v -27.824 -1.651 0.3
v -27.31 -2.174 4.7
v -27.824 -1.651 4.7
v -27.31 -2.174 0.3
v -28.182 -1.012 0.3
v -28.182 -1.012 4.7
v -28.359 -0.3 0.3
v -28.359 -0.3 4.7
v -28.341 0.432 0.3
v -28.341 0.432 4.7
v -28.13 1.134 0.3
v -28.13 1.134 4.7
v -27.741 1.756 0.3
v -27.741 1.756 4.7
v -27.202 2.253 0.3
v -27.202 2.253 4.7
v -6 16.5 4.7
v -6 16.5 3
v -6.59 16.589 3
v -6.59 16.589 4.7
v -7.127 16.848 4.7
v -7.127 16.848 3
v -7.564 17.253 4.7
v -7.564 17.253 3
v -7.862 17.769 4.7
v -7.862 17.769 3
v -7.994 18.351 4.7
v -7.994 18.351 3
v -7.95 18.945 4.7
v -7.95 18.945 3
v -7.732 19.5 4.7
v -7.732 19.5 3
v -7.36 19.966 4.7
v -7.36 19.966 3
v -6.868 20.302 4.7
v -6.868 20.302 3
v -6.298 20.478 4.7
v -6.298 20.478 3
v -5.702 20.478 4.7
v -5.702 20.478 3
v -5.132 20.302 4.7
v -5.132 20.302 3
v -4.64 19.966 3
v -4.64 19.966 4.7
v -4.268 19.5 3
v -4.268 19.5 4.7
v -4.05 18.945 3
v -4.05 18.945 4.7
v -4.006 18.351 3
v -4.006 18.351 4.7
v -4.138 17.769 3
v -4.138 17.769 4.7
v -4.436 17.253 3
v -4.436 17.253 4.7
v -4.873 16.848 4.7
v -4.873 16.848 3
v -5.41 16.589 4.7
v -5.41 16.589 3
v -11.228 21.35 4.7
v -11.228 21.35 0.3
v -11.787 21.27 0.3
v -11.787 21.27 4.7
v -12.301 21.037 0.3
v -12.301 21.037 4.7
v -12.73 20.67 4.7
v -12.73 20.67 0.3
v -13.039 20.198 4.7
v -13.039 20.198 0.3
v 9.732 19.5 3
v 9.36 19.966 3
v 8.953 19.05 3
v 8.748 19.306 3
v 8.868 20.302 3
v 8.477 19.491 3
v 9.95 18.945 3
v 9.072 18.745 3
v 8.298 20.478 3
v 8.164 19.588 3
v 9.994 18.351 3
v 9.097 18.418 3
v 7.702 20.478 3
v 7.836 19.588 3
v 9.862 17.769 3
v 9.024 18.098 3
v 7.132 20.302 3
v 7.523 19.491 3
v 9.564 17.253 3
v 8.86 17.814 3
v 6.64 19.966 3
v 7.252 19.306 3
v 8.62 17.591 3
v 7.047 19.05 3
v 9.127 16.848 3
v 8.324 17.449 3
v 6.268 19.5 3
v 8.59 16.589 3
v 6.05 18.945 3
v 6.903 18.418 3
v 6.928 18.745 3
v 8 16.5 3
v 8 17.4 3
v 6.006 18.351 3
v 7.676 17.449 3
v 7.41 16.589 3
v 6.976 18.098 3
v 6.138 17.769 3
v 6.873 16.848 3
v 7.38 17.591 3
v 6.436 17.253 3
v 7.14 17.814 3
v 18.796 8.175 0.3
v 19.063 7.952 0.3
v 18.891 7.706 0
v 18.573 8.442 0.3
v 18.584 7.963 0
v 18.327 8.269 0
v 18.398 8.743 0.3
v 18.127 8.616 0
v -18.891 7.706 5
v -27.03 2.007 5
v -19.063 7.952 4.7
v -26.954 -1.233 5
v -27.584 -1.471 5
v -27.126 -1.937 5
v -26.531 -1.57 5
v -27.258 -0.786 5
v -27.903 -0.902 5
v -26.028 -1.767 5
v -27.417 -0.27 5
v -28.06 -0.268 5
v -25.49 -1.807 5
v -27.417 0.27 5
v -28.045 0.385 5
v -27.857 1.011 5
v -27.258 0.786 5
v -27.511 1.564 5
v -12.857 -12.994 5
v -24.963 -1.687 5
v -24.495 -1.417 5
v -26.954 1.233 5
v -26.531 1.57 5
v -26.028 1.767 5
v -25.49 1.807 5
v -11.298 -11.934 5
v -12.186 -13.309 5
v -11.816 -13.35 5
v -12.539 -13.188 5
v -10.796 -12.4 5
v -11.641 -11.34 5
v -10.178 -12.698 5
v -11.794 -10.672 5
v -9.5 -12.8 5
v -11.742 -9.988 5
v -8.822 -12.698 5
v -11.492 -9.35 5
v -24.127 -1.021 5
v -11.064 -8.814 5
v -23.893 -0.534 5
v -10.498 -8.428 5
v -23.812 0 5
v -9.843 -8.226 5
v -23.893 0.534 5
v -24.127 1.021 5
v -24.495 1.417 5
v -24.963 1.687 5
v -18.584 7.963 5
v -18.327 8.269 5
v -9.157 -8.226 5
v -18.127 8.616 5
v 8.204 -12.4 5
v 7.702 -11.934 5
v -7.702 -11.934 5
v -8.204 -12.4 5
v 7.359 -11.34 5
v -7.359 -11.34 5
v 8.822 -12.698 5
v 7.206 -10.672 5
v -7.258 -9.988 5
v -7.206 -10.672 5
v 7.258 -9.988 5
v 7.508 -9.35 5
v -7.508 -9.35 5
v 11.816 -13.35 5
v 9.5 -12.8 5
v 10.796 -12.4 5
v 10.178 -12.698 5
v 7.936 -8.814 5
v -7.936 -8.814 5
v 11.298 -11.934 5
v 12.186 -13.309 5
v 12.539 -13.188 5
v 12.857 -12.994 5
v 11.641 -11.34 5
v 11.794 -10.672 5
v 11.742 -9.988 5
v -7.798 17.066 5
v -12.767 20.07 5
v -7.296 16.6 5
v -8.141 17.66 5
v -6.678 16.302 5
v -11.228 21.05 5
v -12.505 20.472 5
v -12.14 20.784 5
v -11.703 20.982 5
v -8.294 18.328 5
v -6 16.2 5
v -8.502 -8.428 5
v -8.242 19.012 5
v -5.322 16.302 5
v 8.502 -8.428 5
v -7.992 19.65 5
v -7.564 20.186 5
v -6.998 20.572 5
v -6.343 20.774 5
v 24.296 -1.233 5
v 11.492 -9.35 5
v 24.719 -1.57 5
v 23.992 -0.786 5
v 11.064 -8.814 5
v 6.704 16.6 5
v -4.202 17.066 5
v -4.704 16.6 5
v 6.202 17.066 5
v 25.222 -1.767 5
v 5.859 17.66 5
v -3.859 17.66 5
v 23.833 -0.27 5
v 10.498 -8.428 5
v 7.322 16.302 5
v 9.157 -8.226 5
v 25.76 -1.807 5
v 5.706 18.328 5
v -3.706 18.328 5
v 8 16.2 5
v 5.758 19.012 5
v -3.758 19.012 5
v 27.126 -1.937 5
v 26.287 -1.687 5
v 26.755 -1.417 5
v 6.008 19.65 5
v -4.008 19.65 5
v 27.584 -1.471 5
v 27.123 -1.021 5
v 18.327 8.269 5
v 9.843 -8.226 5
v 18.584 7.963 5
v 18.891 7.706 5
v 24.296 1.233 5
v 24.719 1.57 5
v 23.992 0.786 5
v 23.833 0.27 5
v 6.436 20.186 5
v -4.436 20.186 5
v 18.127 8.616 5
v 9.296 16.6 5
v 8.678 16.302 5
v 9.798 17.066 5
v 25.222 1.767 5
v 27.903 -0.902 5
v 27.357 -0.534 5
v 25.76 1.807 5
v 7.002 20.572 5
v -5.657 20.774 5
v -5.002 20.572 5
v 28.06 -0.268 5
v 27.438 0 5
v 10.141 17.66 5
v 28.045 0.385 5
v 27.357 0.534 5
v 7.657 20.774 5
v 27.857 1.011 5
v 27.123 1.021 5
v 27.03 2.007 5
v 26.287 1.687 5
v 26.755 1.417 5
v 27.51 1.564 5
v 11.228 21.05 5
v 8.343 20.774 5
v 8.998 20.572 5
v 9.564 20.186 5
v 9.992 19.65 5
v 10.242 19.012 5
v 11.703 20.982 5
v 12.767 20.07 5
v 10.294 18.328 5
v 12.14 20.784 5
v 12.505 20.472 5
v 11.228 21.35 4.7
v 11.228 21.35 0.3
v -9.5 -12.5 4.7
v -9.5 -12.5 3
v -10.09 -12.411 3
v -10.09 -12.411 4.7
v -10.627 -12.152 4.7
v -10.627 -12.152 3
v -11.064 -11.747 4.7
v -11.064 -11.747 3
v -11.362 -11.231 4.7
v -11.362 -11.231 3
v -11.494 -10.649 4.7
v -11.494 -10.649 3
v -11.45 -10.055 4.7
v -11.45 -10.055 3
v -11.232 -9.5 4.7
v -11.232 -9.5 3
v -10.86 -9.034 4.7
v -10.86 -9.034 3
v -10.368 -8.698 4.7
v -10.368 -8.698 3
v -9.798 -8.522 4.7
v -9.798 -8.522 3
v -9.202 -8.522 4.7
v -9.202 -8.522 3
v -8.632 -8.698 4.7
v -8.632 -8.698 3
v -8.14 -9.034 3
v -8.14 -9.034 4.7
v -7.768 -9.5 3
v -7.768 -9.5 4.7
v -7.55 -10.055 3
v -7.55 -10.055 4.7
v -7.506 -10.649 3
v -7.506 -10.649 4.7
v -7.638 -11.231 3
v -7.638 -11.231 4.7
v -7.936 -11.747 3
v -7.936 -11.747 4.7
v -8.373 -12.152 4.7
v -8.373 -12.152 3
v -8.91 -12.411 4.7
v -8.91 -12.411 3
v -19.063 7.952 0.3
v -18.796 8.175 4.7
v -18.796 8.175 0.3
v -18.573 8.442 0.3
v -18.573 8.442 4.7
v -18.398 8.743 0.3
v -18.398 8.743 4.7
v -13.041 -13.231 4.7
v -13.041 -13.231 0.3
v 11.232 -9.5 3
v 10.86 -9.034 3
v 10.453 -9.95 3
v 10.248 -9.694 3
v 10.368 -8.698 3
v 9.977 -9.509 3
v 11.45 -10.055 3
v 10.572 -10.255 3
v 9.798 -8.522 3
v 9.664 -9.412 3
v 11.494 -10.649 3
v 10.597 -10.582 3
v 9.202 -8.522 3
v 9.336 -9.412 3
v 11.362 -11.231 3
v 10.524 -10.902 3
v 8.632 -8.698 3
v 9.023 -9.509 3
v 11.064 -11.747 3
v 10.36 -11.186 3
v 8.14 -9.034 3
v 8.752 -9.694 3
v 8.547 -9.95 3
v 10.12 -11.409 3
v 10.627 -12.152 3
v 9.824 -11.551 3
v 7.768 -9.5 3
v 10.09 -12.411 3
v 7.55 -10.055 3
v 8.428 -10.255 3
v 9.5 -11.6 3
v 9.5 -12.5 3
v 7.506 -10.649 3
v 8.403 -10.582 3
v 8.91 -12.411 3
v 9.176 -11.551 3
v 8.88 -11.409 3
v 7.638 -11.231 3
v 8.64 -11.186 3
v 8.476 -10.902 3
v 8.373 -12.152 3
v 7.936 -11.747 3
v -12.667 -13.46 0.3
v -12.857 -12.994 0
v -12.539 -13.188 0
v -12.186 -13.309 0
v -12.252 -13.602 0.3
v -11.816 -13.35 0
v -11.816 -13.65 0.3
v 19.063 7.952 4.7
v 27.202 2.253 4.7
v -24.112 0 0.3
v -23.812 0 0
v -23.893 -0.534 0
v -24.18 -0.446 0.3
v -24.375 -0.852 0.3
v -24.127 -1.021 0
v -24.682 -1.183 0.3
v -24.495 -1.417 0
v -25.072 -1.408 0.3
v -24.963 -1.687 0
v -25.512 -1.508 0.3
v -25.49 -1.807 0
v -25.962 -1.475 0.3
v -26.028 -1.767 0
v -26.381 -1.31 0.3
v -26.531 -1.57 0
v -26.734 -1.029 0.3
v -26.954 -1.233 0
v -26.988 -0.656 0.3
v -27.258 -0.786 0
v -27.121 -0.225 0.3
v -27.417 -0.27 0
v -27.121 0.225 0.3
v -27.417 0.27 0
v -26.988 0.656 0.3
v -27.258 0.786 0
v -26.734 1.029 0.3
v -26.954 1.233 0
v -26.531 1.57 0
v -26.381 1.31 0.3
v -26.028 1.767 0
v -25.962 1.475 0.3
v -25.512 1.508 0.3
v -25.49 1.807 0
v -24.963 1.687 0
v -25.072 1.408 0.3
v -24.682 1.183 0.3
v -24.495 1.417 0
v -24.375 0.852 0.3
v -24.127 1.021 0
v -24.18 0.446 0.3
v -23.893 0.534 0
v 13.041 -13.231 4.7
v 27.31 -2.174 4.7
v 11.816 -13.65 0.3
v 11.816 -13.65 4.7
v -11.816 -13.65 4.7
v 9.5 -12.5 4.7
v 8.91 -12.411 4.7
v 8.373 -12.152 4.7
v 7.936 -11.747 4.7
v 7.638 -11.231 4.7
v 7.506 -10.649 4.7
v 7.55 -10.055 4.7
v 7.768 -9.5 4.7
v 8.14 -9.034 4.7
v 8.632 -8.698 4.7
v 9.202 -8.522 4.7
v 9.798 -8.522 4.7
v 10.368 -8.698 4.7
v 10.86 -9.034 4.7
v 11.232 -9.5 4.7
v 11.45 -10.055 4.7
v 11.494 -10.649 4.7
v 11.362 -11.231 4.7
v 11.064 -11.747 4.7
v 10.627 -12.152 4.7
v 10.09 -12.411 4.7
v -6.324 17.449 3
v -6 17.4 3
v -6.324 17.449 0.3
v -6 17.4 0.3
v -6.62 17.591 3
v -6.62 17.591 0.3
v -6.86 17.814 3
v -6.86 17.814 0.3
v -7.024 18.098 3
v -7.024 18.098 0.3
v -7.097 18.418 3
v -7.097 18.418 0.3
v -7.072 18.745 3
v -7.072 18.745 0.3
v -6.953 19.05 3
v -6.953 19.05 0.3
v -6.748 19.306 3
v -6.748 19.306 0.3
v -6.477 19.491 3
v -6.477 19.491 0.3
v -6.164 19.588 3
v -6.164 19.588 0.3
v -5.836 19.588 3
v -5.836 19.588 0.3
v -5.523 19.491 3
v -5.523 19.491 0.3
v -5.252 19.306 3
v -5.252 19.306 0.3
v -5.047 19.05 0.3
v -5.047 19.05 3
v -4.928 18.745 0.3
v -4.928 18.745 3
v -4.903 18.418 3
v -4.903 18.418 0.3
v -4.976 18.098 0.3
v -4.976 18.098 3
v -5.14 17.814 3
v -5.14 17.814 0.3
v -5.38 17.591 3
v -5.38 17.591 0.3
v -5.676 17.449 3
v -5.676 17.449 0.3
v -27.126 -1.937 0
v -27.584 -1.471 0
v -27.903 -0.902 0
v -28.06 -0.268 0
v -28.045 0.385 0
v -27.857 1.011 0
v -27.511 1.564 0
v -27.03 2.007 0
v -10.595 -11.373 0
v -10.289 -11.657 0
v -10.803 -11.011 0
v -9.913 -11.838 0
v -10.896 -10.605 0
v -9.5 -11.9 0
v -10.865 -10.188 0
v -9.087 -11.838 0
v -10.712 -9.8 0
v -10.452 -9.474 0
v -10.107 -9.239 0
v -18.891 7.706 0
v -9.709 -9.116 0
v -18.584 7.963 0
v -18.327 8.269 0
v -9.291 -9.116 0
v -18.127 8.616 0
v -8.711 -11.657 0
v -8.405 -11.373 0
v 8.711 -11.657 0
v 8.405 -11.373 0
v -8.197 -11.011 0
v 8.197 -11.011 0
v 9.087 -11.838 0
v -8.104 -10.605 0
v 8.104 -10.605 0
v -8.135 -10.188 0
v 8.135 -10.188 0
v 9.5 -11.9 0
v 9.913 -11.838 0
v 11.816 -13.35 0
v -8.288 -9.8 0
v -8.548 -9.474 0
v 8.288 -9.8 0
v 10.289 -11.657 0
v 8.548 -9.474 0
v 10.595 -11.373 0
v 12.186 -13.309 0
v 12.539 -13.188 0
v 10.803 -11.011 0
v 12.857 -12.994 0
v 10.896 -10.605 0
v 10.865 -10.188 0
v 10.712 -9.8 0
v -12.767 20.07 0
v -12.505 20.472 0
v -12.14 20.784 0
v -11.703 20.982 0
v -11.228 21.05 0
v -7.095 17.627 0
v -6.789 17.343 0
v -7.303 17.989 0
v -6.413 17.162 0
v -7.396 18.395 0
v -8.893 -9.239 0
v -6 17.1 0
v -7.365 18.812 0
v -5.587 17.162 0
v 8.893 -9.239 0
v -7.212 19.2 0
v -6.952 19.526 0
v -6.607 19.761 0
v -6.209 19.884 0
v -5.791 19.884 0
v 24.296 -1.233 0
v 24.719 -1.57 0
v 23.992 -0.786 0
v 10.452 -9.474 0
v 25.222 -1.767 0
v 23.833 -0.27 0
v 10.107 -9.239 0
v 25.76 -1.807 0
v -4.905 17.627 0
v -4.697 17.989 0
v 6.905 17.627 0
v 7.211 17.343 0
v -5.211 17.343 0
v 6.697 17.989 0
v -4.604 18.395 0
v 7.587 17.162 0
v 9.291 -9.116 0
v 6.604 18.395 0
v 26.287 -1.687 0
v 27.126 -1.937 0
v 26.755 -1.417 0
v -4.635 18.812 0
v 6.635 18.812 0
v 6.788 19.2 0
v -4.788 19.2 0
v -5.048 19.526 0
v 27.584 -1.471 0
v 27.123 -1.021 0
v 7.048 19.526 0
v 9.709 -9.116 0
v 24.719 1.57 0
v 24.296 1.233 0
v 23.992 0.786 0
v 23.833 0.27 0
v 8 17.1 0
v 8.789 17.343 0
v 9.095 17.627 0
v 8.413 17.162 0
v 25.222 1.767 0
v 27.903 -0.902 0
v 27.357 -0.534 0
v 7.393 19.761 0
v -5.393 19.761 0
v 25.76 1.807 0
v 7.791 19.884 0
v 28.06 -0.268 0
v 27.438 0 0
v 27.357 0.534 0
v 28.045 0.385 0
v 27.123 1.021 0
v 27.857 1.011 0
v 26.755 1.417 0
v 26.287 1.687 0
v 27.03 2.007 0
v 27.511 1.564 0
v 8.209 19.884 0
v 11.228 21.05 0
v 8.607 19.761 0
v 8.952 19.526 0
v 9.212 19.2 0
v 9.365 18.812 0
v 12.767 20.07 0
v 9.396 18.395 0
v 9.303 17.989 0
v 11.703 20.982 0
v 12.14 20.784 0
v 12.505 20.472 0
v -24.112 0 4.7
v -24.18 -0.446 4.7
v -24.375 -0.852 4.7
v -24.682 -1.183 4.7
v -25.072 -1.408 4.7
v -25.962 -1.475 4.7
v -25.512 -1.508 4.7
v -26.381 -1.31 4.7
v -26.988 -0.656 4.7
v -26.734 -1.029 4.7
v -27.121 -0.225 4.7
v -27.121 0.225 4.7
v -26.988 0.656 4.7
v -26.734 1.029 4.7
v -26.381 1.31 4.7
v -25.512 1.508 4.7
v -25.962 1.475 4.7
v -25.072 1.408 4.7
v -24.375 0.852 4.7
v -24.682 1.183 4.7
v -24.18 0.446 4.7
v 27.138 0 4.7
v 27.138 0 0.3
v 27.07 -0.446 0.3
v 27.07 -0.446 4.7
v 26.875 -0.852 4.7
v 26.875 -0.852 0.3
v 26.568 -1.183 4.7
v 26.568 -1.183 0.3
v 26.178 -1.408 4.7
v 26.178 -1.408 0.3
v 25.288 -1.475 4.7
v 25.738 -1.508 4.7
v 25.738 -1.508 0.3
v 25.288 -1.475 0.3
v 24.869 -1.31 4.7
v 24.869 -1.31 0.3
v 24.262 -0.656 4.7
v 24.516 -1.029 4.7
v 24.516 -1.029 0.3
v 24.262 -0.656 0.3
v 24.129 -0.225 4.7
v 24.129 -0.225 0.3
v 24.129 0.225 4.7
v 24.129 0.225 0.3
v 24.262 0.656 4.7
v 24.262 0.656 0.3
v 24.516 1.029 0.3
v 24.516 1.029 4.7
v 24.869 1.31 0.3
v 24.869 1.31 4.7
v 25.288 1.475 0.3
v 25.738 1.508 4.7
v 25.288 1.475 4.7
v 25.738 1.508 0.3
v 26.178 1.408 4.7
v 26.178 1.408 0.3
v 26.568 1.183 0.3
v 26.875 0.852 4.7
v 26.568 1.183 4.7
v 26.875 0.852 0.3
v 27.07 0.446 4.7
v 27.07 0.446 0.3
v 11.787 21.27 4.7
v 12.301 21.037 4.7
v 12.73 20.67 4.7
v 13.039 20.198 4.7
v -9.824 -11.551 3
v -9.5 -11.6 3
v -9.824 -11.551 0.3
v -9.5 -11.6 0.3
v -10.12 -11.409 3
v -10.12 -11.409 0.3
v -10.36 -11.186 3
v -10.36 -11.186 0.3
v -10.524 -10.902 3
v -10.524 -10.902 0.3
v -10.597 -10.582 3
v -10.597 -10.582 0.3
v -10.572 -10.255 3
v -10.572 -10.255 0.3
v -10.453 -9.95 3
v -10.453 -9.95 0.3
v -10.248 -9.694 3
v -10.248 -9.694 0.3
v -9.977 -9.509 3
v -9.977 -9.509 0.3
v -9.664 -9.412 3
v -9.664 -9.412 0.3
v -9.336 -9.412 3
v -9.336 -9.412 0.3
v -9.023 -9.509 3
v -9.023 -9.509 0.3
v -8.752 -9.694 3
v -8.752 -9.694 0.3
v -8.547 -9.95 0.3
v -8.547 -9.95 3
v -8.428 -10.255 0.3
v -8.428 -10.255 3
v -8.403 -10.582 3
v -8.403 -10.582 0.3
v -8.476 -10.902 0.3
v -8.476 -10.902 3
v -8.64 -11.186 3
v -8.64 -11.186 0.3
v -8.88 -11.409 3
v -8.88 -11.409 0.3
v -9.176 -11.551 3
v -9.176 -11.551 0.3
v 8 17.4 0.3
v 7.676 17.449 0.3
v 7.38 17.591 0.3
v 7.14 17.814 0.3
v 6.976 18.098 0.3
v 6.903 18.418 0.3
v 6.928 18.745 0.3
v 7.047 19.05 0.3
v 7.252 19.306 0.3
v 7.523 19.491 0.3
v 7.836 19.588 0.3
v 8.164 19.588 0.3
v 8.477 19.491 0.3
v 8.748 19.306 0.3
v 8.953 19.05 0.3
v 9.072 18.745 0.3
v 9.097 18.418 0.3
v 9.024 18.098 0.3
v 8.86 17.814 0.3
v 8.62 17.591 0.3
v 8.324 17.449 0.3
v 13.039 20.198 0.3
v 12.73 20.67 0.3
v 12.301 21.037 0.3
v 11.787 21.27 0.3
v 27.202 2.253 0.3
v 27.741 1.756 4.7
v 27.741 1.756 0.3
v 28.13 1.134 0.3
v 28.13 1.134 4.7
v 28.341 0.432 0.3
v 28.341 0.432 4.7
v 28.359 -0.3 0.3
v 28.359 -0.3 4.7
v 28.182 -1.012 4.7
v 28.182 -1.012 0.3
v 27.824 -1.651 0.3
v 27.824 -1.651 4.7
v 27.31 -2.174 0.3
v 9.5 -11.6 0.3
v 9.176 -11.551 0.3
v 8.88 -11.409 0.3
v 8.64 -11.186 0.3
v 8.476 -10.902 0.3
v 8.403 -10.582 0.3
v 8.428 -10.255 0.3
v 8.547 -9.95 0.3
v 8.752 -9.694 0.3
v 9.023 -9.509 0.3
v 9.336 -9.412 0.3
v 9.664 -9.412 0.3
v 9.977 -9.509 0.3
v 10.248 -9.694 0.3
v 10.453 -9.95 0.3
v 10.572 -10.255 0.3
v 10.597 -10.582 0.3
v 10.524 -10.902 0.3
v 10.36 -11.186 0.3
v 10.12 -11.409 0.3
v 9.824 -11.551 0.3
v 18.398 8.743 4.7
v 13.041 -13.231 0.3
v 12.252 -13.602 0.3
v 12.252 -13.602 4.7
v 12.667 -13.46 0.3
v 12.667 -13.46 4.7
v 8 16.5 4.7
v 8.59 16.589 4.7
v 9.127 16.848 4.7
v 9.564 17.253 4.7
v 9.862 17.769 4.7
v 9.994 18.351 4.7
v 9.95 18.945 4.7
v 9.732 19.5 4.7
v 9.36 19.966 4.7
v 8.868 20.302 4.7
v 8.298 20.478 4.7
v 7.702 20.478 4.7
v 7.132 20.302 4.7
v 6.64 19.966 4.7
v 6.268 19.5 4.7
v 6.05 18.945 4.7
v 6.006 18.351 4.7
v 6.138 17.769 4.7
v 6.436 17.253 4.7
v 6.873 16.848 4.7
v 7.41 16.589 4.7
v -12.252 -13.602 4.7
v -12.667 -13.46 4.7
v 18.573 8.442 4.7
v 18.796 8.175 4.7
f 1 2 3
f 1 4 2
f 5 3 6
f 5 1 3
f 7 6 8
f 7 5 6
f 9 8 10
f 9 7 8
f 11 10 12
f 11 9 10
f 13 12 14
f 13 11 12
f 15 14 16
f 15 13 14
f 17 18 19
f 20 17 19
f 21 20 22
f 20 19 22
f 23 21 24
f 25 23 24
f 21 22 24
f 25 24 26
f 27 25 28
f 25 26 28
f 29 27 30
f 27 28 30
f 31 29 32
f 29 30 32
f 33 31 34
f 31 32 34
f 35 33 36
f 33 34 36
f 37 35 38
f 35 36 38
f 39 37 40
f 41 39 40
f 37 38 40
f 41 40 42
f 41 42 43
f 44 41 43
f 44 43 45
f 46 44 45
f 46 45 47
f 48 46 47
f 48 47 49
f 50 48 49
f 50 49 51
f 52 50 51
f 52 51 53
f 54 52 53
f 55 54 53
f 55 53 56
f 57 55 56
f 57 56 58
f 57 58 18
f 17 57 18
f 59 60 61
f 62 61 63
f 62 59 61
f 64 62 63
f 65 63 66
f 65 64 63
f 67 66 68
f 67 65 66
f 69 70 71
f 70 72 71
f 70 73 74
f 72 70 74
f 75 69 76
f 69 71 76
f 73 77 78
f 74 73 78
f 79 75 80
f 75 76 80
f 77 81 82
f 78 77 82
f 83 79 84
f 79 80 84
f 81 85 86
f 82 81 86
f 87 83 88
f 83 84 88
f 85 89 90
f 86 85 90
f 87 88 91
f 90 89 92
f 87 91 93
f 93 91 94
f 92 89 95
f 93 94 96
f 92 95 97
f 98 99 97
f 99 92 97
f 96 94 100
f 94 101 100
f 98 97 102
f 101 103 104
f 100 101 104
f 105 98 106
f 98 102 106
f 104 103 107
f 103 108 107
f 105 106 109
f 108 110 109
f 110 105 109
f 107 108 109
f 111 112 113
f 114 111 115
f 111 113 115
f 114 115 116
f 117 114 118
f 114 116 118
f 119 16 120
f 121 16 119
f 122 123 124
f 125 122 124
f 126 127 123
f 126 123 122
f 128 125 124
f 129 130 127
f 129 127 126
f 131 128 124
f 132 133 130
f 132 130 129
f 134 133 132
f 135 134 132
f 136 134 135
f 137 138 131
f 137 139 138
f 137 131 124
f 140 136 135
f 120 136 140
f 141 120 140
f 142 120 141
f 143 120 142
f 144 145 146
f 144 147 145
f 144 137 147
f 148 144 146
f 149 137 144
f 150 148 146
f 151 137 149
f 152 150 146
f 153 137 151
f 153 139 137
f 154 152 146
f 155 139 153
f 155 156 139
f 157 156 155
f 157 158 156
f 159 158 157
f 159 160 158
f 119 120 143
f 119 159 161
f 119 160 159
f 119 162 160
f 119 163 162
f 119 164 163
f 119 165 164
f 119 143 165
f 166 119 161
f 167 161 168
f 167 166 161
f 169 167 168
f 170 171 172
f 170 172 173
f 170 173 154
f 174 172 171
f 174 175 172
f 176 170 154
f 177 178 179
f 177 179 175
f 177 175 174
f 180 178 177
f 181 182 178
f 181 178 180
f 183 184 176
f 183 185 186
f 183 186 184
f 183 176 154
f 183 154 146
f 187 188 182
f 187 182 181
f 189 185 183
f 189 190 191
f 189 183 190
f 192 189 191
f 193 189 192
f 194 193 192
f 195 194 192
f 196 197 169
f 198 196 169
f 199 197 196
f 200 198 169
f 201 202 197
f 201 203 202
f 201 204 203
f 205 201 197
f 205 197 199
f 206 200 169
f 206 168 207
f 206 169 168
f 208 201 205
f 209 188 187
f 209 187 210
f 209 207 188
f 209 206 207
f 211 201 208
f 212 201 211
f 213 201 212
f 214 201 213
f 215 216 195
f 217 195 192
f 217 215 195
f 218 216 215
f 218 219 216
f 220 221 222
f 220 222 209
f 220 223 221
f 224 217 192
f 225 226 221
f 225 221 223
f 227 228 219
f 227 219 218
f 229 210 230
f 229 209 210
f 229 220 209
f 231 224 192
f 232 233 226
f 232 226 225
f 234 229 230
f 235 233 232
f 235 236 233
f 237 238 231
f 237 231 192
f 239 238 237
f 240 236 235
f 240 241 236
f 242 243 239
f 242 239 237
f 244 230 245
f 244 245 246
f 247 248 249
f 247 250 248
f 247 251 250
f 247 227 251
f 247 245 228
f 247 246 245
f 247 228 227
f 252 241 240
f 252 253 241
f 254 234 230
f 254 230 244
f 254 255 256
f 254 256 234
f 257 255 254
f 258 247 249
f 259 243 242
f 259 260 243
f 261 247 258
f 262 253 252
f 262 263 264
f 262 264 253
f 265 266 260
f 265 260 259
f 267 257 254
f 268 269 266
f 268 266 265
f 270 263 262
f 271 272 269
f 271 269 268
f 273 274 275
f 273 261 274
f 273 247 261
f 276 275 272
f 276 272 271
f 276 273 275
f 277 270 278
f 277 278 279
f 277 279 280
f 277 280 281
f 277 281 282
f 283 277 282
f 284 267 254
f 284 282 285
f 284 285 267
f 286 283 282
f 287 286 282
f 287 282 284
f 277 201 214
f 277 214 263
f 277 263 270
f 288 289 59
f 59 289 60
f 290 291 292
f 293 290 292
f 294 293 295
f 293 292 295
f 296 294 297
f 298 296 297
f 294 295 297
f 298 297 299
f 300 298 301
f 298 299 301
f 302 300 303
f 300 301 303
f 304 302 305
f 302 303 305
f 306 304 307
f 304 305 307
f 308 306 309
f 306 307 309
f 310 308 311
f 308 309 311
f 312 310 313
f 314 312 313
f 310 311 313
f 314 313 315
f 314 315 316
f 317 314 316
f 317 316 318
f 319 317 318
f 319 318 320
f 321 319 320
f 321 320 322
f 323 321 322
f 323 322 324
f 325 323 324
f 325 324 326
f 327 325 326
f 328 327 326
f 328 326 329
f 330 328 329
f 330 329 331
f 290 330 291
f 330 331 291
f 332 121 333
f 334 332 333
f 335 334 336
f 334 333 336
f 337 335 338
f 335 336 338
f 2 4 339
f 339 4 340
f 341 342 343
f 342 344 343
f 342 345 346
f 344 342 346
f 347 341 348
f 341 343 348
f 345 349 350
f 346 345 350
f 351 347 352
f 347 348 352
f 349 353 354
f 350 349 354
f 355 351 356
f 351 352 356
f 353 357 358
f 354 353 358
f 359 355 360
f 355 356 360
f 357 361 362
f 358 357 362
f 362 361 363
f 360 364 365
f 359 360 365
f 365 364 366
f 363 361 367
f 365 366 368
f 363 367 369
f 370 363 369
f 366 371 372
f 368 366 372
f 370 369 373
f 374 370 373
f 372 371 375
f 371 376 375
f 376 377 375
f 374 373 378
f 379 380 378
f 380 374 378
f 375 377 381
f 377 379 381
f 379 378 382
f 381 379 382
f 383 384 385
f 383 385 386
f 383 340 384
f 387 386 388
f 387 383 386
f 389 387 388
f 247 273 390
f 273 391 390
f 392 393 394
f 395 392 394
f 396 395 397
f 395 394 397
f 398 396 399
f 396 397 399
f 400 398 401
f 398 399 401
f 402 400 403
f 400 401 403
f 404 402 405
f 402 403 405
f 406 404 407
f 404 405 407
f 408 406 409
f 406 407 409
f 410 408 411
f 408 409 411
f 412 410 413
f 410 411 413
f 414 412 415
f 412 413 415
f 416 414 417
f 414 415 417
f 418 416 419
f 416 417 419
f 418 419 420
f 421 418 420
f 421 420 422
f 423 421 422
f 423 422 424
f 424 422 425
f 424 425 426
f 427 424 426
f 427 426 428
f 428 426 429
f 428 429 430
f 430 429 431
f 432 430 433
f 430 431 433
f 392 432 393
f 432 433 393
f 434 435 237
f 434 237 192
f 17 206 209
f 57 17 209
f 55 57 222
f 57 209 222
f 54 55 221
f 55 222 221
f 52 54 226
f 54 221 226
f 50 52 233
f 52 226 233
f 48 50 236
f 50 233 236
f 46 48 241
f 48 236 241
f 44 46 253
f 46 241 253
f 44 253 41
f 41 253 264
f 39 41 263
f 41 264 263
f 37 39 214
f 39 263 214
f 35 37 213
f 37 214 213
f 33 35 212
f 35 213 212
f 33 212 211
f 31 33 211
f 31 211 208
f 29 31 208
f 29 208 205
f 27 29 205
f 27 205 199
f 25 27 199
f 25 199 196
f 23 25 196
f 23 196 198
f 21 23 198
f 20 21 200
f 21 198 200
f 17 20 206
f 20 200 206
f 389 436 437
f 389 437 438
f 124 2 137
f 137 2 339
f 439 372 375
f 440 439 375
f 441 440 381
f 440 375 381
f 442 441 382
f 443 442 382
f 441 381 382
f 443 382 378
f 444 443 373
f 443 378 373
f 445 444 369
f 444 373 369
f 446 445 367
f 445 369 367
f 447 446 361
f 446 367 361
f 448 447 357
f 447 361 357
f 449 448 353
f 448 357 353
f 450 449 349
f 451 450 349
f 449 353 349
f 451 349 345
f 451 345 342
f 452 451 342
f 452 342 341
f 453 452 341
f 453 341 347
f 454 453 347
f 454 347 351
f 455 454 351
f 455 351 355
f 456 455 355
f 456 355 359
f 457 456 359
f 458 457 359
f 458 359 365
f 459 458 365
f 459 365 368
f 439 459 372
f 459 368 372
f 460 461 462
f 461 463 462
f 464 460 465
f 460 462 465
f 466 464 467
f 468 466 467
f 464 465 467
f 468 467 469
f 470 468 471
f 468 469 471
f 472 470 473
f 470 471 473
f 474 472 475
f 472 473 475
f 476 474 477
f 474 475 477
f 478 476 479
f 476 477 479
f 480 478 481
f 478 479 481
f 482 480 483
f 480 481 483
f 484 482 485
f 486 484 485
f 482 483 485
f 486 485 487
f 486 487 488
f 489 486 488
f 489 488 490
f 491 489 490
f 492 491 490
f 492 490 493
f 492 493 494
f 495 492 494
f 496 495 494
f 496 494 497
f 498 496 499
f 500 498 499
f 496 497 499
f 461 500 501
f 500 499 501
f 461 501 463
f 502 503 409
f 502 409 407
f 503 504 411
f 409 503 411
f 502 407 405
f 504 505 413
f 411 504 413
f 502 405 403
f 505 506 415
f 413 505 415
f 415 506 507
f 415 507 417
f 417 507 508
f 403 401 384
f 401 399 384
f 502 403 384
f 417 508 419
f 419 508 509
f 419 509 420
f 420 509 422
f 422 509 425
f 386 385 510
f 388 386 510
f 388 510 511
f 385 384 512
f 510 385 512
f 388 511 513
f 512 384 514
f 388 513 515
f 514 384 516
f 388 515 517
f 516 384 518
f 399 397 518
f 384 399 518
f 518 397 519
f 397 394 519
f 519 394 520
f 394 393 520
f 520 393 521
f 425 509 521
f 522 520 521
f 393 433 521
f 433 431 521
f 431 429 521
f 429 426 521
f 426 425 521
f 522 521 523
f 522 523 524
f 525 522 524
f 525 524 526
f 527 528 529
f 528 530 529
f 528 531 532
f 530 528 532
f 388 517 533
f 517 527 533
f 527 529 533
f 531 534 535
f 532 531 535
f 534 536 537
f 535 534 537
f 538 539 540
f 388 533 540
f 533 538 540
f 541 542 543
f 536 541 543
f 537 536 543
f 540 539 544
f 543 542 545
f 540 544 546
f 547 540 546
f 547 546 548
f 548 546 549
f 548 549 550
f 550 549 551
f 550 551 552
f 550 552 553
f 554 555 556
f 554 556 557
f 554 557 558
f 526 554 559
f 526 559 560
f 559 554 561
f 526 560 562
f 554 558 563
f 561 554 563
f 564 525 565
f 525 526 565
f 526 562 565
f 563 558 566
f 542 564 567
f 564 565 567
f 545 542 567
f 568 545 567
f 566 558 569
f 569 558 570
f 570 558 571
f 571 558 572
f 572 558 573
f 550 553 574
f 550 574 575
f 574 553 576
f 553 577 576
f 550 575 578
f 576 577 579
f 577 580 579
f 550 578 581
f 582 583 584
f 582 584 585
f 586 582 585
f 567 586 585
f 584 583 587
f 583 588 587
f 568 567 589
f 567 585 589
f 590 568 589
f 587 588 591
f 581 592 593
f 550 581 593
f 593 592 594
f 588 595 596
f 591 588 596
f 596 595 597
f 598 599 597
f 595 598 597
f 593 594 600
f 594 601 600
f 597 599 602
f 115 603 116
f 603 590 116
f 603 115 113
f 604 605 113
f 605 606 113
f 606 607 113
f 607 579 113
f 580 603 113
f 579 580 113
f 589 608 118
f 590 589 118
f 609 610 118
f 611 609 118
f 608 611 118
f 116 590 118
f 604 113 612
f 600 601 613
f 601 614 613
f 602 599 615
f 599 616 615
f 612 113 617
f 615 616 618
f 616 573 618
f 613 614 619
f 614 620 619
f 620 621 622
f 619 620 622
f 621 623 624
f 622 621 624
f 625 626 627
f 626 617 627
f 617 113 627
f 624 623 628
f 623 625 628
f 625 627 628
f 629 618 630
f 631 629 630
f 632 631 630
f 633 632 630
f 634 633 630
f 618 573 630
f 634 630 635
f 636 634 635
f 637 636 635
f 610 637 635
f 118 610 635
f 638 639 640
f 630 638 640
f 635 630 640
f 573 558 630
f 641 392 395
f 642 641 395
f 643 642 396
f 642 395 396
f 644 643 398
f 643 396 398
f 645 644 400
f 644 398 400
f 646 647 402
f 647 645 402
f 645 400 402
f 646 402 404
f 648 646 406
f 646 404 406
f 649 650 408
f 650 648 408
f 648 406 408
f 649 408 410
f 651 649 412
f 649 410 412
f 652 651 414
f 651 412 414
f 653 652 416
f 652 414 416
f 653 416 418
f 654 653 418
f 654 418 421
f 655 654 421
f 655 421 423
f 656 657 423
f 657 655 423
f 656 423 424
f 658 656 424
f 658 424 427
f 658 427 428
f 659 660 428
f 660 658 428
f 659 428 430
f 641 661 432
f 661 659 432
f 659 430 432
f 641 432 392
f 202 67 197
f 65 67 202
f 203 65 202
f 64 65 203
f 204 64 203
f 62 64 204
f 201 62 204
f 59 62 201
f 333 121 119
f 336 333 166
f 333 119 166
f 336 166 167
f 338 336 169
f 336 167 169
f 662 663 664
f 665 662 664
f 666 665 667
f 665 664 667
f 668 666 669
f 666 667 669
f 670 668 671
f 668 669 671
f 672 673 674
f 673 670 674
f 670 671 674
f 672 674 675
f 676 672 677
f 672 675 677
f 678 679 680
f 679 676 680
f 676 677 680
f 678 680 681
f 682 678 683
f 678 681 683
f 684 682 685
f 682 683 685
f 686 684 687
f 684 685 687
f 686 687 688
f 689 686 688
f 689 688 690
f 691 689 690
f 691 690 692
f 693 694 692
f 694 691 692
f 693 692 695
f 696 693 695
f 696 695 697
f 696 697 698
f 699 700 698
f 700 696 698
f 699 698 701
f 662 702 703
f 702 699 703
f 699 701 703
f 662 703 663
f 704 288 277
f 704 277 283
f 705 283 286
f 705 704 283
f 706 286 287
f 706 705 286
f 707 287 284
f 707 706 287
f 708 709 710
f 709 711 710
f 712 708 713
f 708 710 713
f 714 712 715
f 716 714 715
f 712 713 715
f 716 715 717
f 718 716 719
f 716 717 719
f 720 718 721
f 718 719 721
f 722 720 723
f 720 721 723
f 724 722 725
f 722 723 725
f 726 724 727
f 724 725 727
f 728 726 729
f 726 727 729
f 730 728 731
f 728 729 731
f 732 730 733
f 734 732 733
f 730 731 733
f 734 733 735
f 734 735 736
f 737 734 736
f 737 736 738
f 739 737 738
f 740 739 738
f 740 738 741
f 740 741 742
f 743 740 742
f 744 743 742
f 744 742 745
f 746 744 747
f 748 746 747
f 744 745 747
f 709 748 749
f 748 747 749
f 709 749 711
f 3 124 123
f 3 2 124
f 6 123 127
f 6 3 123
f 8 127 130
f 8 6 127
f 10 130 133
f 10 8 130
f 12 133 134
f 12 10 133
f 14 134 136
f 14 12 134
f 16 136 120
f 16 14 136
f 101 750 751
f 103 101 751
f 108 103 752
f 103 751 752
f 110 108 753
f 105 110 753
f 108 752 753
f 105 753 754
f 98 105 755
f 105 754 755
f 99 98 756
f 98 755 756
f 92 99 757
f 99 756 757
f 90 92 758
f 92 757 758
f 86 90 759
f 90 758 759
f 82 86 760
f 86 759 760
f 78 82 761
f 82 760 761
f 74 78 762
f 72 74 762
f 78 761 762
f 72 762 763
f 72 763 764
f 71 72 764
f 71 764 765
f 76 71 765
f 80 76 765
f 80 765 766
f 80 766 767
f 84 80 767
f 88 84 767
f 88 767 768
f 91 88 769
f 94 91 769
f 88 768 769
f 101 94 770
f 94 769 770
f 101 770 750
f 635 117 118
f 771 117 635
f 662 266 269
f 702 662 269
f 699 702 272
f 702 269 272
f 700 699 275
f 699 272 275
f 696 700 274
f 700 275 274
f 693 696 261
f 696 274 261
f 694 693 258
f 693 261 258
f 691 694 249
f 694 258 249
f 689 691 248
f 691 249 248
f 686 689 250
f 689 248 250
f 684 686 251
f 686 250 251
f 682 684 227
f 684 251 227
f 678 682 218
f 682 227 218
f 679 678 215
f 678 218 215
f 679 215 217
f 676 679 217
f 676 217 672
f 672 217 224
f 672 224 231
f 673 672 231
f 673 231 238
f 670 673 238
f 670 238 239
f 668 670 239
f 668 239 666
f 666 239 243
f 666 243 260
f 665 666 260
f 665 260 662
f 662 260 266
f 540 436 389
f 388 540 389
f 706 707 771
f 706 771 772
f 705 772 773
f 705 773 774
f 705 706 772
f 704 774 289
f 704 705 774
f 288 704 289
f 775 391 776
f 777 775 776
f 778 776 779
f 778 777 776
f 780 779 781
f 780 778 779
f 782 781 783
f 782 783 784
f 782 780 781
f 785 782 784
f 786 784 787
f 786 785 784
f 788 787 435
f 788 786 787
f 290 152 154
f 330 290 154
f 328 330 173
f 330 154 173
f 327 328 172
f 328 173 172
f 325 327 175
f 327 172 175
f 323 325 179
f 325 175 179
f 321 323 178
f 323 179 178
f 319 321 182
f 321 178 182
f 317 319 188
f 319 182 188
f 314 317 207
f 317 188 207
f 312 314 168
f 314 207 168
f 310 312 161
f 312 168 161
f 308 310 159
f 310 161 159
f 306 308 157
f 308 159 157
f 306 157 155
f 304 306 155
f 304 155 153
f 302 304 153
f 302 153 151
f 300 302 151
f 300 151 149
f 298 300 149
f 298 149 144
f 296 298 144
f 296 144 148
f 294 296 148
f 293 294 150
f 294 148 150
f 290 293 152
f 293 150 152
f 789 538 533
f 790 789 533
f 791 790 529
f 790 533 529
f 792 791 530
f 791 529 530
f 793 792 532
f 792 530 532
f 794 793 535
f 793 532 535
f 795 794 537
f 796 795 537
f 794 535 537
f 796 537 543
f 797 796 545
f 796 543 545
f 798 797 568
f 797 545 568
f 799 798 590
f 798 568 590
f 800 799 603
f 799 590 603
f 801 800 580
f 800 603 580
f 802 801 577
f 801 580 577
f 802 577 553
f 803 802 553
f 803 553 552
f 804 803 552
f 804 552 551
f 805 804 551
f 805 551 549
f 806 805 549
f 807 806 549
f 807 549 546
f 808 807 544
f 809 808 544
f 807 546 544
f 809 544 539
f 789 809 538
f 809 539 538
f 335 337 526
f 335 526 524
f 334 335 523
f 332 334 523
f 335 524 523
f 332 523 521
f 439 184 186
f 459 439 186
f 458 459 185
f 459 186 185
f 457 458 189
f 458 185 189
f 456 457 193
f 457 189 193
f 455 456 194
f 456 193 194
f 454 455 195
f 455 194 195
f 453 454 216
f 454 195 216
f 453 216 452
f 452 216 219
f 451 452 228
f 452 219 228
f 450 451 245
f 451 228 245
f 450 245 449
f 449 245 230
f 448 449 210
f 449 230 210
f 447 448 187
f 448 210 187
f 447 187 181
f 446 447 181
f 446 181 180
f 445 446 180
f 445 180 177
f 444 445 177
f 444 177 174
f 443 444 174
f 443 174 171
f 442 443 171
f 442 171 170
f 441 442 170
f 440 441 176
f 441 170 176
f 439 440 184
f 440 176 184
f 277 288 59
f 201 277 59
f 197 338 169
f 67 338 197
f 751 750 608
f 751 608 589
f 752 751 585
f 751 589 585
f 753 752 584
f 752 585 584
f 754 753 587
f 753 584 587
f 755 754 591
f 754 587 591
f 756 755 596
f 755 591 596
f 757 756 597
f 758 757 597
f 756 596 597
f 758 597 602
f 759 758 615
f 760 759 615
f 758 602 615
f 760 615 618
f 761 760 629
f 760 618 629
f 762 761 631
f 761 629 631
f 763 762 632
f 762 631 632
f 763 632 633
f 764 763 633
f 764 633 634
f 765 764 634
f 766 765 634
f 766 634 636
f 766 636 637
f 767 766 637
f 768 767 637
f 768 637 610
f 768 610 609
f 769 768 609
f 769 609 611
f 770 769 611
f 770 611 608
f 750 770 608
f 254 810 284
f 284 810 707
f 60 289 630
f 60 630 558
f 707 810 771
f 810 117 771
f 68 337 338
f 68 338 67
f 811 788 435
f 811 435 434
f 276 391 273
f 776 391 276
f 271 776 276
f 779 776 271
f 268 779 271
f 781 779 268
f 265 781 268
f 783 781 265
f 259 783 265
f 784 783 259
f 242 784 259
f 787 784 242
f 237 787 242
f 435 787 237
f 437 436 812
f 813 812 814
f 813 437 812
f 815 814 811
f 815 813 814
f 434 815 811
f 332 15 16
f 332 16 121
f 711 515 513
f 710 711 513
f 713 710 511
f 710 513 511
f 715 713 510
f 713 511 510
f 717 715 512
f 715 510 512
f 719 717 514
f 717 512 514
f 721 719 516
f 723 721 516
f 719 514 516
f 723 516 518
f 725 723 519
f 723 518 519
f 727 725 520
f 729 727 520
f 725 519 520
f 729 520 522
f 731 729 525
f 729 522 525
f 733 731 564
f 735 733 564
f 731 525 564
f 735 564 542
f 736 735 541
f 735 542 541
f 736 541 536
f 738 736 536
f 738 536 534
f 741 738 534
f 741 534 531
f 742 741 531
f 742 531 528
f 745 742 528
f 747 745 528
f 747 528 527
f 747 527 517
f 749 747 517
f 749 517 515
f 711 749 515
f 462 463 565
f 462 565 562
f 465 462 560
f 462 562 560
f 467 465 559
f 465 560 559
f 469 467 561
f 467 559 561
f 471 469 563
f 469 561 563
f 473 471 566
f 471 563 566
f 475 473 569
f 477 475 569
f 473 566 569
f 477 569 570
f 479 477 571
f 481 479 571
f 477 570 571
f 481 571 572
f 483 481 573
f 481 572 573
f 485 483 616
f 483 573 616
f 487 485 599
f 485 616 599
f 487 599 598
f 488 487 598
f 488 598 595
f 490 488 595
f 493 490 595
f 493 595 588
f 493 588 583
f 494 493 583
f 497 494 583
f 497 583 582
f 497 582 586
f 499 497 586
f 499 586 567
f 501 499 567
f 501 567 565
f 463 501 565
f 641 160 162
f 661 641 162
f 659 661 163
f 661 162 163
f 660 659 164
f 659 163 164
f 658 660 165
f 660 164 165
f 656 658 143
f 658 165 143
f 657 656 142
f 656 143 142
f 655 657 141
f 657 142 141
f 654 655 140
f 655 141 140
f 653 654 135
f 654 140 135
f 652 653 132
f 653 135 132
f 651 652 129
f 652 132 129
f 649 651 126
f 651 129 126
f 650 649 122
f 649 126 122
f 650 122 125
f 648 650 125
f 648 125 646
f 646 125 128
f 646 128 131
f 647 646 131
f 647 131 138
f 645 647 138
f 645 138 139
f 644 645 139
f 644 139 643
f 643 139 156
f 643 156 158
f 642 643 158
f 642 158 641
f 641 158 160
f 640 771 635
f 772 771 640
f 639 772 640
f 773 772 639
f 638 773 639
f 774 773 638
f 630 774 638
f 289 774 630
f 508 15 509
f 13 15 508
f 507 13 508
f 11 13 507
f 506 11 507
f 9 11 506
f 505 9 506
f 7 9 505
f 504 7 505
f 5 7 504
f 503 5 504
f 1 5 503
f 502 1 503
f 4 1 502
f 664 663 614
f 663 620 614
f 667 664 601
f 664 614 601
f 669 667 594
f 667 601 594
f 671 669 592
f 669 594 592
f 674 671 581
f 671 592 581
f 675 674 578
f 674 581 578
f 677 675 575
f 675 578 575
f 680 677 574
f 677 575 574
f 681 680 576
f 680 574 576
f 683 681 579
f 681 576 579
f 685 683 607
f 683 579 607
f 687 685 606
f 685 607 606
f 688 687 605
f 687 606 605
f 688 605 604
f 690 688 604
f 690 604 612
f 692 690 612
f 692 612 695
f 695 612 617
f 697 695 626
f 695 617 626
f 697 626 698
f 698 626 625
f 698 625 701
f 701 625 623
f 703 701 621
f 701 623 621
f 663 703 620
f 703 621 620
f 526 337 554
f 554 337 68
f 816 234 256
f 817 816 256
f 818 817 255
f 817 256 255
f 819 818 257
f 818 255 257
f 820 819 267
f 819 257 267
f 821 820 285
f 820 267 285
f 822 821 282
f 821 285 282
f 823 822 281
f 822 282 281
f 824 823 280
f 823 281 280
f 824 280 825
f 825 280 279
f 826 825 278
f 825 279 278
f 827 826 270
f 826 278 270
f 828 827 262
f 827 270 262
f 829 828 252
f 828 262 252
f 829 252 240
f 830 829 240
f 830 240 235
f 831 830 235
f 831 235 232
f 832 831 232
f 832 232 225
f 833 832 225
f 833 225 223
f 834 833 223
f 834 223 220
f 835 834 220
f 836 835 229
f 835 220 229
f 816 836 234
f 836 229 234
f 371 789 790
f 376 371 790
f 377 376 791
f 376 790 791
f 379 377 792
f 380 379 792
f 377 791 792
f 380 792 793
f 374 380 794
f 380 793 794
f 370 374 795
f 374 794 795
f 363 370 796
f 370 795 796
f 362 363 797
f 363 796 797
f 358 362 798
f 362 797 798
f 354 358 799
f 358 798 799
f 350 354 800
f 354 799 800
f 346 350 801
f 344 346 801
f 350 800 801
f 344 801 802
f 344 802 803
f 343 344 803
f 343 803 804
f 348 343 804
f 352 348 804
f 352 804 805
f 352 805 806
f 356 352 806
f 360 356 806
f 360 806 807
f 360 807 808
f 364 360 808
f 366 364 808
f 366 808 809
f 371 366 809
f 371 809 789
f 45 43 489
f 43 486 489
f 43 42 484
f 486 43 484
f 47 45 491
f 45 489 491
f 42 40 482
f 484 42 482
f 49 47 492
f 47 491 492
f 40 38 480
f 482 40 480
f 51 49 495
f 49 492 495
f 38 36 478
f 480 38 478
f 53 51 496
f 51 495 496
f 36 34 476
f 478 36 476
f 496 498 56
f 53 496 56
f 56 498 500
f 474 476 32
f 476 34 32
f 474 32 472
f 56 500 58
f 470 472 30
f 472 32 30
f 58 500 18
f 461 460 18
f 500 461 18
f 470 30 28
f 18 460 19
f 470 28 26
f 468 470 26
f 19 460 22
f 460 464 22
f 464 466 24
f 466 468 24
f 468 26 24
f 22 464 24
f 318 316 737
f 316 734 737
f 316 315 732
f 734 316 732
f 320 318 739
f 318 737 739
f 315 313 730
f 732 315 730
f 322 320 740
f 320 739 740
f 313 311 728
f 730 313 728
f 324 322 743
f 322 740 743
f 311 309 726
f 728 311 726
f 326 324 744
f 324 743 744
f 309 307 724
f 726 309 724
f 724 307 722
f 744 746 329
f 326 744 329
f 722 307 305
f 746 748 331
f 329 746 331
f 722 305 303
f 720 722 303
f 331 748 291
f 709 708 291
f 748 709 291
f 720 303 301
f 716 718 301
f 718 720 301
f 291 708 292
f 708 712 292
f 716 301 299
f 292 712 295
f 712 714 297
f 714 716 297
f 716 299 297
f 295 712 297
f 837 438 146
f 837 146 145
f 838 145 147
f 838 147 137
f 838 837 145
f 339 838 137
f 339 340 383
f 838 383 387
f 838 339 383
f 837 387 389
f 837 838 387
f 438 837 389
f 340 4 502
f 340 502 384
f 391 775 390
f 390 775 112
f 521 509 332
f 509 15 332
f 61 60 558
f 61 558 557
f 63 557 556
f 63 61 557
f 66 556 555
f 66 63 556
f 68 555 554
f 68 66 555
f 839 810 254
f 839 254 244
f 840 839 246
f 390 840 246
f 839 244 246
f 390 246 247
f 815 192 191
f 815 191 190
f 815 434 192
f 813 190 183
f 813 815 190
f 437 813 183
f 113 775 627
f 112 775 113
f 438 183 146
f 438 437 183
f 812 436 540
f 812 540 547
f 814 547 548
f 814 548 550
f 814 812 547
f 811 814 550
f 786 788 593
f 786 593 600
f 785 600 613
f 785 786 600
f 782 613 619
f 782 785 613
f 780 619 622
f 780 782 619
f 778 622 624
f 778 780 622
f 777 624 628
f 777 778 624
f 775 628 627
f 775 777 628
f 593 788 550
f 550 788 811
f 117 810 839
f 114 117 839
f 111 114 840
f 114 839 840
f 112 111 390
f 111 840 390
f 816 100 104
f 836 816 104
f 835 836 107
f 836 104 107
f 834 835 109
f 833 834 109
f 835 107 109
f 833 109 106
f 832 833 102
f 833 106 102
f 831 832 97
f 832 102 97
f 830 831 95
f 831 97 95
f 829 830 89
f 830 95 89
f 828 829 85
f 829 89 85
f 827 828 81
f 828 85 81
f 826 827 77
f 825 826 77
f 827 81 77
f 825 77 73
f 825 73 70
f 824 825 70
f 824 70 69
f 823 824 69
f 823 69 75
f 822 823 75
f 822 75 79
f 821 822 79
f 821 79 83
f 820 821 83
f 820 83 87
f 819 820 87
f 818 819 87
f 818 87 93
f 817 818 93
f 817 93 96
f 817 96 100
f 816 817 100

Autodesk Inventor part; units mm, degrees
ref_plane "YZ Plane" through (0, 0, 0) normal (1, 0, 0) x (0, 1, 0)
ref_plane "XZ Plane" through (0, 0, 0) normal (0, 1, 0) x (-1, 0, 0)
ref_plane "XY Plane" through (0, 0, 0) normal (0, 0, 1) x (1, 0, 0)
sketch "Sketch1" plane through (0, 0, 0) normal (0, 0, 1) x (1, 0, 0)
  circle A0 centre (25.625, 0) radius 1.5125
  line L0 (12.5, 21.35) -> (0, 21.35)
  line L1 (0, -20.65) -> (0, 28.35) construction
  line L2 (-39.7989, 0) -> (39.7989, 0) construction
  line L3 (27.3095, -2.1737) -> (12.5, -13.65)
  line L4 (12.5, -13.65) -> (0, -13.65)
  arc A1 (27.3095, -2.1737) -> (27.2023, 2.2527) centre (25.625, 0) ccw
  circle A2 centre (-25.625, 0) radius 1.5125
  line L5 (-12.5, 21.35) -> (0, 21.35)
  line L6 (-27.3095, -2.1737) -> (-12.5, -13.65)
  line L7 (-12.5, -13.65) -> (0, -13.65)
  arc A3 (-27.2023, 2.2527) -> (-27.3095, -2.1737) centre (-25.625, 0) ccw
  line L8 (27.2023, 2.2527) -> (18.625, 8.2586)
  line L9 (18.625, 8.2586) -> (12.5, 21.35)
  line L10 (-27.2023, 2.2527) -> (-18.625, 8.2586)
  line L11 (-18.625, 8.2586) -> (-12.5, 21.35)
  point P0 (0, 0)
  dimension "d0" = 51.25
  dimension "d1" = 3.025
  dimension "d2" = 2.75
  dimension "d84" = 21.35
  dimension "d85" = 13.65
  dimension "d86" = 25
  dimension "d87" = 25
  dimension "d88" = 35
  dimension "d89" = 7
extrude "Extrusion1" add sketch "Sketch1" along normal blind 5
sketch "Sketch4" plane through (0, 0, 5) normal (0, 0, 1) x (1, 0, 0)
  line L0 (-39.725, 0) -> (39.725, 0) construction
  line L1 (0, -20.65) -> (0, 28.35) construction
  point P0 (0, 0)
  point P1 (9.5, -10.5)
  point P2 (8, 18.5)
  point P3 (-6, 18.5)
  point P4 (-9.5, -10.5)
  dimension "d90" = 10.5
  dimension "d91" = 9.5
  dimension "d92" = 18.5
  dimension "d93" = 18.5
  dimension "d94" = 8
  dimension "d95" = 6
hole "Hole2" at (9.5, -10.5, 5) at (8, 18.5, 5) at (-6, 18.5, 5) at (-9.5, -10.5, 5) direction (0, 0, -1) diameter 2.2 end through all counterbore diameter 4 counterbore depth 2
fillet "Fillet5" radius 2 6 edges at (-18.625, 8.2586, 2.5) (18.625, 8.2586, 2.5) (12.5, -13.65, 2.5) (-12.5, -13.65, 2.5) (12.5, 21.35, 2.5) (-12.5, 21.35, 2.5)
chamfer "Chamfer4" distance 0.3 angle 45 44 edges at (0, 21.35, 5) (-12.3012, 21.0375, 5) (-15.7188, 14.4701, 5) (-18.6787, 8.3037, 5) (-23.1326, 5.1023, 5) (-28.3742, 0.0665, 5) (12.3012, 21.0375, 5) (15.7188, 14.4701, 5) (18.6787, 8.3037, 5) (23.1326, 5.1023, 5) (28.3742, 0.0665, 5) (0, 21.35, 0) (12.3012, 21.0375, 0) (15.7188, 14.4701, 0) (18.6787, 8.3037, 0) (23.1326, 5.1023, 0) (28.3742, 0.0665, 0) (-12.3012, 21.0375, 0) (-15.7188, 14.4701, 0) (-18.6787, 8.3037, 0) (-23.1326, 5.1023, 0) (-28.3742, 0.0665, 0) (-20.1752, -7.7023, 5) (-12.4632, -13.5423, 5) (0, -13.65, 5) (12.4632, -13.5423, 5) (20.1752, -7.7023, 5) (-20.1752, -7.7023, 0) (-12.4632, -13.5423, 0) (0, -13.65, 0) (12.4632, -13.5423, 0) (20.1752, -7.7023, 0) (-27.1375, 0, 0) (-9.5, -9.4, 0) (9.5, -9.4, 0) (-6, 19.6, 0) (8, 19.6, 0) (24.1125, 0, 0) (-27.1375, 0, 5) (24.1125, 0, 5) (-9.5, -8.5, 5) (9.5, -8.5, 5) (-6, 20.5, 5) (8, 20.5, 5)
equation "\"d0\" = dist_hinge_points"
equation "\"d1\" = bore_clearance"
equation "\"d104\" = champfer"
equation "\"finger_width\" = 25"
equation "\"finger_thickness\" = 8"
equation "\"finger_part_A_length\" = 42.8625"
equation "\"finger_part_B_length\" = 28.575"
equation "\"finger_link_width\" = 3.5"
equation "\"finger_link_clearence\" = 0.075"
equation "\"tol\" = 0.5 * finger_link_clearence"
equation "\"link_tol\" = 0.254"
equation "\"bore_press\" = 2.925"
equation "\"bore_clearance\" = 3.025"
equation "\"bar_diameter\" = 6.5"
equation "\"bar_thickness\" = 4"
equation "\"bar_width\" = 7"
equation "\"hinge_dist_sym_plane\" = 4"
equation "\"hinge_thickness\" = 3"
equation "\"hinge_act_length_c\" = 7.62"
equation "\"hinge_act_length_bc\" = 16.66875"
equation "\"hinge_act_length_ab\" = 11.049"
equation "\"hinge_act_length_a\" = 21.43125"
equation "\"hinge_guid_length_c\" = 9.525"
equation "\"hinge_guid_length_bc\" = 9.525"
equation "\"hinge_guid_length_ab\" = 17.145"
equation "\"hinge_guid_length_a\" = 17.145"
equation "\"bar_length_bc\" = finger_part_B_length"
equation "\"bar_act_length_ab\" = 40.48125"
equation "\"bar_guid_length_ab\" = 43.275"
equation "\"champfer\" = 0.3"
equation "\"fillet\" = 0.4"
equation "\"hinge_point\" = 15"
equation "\"dist_finger_BC\" = 56.5"
equation "\"gear_diameter\" = 14"
equation "\"dist_hinge_points\" = 51.25"
properties part number "tilt-guide"
